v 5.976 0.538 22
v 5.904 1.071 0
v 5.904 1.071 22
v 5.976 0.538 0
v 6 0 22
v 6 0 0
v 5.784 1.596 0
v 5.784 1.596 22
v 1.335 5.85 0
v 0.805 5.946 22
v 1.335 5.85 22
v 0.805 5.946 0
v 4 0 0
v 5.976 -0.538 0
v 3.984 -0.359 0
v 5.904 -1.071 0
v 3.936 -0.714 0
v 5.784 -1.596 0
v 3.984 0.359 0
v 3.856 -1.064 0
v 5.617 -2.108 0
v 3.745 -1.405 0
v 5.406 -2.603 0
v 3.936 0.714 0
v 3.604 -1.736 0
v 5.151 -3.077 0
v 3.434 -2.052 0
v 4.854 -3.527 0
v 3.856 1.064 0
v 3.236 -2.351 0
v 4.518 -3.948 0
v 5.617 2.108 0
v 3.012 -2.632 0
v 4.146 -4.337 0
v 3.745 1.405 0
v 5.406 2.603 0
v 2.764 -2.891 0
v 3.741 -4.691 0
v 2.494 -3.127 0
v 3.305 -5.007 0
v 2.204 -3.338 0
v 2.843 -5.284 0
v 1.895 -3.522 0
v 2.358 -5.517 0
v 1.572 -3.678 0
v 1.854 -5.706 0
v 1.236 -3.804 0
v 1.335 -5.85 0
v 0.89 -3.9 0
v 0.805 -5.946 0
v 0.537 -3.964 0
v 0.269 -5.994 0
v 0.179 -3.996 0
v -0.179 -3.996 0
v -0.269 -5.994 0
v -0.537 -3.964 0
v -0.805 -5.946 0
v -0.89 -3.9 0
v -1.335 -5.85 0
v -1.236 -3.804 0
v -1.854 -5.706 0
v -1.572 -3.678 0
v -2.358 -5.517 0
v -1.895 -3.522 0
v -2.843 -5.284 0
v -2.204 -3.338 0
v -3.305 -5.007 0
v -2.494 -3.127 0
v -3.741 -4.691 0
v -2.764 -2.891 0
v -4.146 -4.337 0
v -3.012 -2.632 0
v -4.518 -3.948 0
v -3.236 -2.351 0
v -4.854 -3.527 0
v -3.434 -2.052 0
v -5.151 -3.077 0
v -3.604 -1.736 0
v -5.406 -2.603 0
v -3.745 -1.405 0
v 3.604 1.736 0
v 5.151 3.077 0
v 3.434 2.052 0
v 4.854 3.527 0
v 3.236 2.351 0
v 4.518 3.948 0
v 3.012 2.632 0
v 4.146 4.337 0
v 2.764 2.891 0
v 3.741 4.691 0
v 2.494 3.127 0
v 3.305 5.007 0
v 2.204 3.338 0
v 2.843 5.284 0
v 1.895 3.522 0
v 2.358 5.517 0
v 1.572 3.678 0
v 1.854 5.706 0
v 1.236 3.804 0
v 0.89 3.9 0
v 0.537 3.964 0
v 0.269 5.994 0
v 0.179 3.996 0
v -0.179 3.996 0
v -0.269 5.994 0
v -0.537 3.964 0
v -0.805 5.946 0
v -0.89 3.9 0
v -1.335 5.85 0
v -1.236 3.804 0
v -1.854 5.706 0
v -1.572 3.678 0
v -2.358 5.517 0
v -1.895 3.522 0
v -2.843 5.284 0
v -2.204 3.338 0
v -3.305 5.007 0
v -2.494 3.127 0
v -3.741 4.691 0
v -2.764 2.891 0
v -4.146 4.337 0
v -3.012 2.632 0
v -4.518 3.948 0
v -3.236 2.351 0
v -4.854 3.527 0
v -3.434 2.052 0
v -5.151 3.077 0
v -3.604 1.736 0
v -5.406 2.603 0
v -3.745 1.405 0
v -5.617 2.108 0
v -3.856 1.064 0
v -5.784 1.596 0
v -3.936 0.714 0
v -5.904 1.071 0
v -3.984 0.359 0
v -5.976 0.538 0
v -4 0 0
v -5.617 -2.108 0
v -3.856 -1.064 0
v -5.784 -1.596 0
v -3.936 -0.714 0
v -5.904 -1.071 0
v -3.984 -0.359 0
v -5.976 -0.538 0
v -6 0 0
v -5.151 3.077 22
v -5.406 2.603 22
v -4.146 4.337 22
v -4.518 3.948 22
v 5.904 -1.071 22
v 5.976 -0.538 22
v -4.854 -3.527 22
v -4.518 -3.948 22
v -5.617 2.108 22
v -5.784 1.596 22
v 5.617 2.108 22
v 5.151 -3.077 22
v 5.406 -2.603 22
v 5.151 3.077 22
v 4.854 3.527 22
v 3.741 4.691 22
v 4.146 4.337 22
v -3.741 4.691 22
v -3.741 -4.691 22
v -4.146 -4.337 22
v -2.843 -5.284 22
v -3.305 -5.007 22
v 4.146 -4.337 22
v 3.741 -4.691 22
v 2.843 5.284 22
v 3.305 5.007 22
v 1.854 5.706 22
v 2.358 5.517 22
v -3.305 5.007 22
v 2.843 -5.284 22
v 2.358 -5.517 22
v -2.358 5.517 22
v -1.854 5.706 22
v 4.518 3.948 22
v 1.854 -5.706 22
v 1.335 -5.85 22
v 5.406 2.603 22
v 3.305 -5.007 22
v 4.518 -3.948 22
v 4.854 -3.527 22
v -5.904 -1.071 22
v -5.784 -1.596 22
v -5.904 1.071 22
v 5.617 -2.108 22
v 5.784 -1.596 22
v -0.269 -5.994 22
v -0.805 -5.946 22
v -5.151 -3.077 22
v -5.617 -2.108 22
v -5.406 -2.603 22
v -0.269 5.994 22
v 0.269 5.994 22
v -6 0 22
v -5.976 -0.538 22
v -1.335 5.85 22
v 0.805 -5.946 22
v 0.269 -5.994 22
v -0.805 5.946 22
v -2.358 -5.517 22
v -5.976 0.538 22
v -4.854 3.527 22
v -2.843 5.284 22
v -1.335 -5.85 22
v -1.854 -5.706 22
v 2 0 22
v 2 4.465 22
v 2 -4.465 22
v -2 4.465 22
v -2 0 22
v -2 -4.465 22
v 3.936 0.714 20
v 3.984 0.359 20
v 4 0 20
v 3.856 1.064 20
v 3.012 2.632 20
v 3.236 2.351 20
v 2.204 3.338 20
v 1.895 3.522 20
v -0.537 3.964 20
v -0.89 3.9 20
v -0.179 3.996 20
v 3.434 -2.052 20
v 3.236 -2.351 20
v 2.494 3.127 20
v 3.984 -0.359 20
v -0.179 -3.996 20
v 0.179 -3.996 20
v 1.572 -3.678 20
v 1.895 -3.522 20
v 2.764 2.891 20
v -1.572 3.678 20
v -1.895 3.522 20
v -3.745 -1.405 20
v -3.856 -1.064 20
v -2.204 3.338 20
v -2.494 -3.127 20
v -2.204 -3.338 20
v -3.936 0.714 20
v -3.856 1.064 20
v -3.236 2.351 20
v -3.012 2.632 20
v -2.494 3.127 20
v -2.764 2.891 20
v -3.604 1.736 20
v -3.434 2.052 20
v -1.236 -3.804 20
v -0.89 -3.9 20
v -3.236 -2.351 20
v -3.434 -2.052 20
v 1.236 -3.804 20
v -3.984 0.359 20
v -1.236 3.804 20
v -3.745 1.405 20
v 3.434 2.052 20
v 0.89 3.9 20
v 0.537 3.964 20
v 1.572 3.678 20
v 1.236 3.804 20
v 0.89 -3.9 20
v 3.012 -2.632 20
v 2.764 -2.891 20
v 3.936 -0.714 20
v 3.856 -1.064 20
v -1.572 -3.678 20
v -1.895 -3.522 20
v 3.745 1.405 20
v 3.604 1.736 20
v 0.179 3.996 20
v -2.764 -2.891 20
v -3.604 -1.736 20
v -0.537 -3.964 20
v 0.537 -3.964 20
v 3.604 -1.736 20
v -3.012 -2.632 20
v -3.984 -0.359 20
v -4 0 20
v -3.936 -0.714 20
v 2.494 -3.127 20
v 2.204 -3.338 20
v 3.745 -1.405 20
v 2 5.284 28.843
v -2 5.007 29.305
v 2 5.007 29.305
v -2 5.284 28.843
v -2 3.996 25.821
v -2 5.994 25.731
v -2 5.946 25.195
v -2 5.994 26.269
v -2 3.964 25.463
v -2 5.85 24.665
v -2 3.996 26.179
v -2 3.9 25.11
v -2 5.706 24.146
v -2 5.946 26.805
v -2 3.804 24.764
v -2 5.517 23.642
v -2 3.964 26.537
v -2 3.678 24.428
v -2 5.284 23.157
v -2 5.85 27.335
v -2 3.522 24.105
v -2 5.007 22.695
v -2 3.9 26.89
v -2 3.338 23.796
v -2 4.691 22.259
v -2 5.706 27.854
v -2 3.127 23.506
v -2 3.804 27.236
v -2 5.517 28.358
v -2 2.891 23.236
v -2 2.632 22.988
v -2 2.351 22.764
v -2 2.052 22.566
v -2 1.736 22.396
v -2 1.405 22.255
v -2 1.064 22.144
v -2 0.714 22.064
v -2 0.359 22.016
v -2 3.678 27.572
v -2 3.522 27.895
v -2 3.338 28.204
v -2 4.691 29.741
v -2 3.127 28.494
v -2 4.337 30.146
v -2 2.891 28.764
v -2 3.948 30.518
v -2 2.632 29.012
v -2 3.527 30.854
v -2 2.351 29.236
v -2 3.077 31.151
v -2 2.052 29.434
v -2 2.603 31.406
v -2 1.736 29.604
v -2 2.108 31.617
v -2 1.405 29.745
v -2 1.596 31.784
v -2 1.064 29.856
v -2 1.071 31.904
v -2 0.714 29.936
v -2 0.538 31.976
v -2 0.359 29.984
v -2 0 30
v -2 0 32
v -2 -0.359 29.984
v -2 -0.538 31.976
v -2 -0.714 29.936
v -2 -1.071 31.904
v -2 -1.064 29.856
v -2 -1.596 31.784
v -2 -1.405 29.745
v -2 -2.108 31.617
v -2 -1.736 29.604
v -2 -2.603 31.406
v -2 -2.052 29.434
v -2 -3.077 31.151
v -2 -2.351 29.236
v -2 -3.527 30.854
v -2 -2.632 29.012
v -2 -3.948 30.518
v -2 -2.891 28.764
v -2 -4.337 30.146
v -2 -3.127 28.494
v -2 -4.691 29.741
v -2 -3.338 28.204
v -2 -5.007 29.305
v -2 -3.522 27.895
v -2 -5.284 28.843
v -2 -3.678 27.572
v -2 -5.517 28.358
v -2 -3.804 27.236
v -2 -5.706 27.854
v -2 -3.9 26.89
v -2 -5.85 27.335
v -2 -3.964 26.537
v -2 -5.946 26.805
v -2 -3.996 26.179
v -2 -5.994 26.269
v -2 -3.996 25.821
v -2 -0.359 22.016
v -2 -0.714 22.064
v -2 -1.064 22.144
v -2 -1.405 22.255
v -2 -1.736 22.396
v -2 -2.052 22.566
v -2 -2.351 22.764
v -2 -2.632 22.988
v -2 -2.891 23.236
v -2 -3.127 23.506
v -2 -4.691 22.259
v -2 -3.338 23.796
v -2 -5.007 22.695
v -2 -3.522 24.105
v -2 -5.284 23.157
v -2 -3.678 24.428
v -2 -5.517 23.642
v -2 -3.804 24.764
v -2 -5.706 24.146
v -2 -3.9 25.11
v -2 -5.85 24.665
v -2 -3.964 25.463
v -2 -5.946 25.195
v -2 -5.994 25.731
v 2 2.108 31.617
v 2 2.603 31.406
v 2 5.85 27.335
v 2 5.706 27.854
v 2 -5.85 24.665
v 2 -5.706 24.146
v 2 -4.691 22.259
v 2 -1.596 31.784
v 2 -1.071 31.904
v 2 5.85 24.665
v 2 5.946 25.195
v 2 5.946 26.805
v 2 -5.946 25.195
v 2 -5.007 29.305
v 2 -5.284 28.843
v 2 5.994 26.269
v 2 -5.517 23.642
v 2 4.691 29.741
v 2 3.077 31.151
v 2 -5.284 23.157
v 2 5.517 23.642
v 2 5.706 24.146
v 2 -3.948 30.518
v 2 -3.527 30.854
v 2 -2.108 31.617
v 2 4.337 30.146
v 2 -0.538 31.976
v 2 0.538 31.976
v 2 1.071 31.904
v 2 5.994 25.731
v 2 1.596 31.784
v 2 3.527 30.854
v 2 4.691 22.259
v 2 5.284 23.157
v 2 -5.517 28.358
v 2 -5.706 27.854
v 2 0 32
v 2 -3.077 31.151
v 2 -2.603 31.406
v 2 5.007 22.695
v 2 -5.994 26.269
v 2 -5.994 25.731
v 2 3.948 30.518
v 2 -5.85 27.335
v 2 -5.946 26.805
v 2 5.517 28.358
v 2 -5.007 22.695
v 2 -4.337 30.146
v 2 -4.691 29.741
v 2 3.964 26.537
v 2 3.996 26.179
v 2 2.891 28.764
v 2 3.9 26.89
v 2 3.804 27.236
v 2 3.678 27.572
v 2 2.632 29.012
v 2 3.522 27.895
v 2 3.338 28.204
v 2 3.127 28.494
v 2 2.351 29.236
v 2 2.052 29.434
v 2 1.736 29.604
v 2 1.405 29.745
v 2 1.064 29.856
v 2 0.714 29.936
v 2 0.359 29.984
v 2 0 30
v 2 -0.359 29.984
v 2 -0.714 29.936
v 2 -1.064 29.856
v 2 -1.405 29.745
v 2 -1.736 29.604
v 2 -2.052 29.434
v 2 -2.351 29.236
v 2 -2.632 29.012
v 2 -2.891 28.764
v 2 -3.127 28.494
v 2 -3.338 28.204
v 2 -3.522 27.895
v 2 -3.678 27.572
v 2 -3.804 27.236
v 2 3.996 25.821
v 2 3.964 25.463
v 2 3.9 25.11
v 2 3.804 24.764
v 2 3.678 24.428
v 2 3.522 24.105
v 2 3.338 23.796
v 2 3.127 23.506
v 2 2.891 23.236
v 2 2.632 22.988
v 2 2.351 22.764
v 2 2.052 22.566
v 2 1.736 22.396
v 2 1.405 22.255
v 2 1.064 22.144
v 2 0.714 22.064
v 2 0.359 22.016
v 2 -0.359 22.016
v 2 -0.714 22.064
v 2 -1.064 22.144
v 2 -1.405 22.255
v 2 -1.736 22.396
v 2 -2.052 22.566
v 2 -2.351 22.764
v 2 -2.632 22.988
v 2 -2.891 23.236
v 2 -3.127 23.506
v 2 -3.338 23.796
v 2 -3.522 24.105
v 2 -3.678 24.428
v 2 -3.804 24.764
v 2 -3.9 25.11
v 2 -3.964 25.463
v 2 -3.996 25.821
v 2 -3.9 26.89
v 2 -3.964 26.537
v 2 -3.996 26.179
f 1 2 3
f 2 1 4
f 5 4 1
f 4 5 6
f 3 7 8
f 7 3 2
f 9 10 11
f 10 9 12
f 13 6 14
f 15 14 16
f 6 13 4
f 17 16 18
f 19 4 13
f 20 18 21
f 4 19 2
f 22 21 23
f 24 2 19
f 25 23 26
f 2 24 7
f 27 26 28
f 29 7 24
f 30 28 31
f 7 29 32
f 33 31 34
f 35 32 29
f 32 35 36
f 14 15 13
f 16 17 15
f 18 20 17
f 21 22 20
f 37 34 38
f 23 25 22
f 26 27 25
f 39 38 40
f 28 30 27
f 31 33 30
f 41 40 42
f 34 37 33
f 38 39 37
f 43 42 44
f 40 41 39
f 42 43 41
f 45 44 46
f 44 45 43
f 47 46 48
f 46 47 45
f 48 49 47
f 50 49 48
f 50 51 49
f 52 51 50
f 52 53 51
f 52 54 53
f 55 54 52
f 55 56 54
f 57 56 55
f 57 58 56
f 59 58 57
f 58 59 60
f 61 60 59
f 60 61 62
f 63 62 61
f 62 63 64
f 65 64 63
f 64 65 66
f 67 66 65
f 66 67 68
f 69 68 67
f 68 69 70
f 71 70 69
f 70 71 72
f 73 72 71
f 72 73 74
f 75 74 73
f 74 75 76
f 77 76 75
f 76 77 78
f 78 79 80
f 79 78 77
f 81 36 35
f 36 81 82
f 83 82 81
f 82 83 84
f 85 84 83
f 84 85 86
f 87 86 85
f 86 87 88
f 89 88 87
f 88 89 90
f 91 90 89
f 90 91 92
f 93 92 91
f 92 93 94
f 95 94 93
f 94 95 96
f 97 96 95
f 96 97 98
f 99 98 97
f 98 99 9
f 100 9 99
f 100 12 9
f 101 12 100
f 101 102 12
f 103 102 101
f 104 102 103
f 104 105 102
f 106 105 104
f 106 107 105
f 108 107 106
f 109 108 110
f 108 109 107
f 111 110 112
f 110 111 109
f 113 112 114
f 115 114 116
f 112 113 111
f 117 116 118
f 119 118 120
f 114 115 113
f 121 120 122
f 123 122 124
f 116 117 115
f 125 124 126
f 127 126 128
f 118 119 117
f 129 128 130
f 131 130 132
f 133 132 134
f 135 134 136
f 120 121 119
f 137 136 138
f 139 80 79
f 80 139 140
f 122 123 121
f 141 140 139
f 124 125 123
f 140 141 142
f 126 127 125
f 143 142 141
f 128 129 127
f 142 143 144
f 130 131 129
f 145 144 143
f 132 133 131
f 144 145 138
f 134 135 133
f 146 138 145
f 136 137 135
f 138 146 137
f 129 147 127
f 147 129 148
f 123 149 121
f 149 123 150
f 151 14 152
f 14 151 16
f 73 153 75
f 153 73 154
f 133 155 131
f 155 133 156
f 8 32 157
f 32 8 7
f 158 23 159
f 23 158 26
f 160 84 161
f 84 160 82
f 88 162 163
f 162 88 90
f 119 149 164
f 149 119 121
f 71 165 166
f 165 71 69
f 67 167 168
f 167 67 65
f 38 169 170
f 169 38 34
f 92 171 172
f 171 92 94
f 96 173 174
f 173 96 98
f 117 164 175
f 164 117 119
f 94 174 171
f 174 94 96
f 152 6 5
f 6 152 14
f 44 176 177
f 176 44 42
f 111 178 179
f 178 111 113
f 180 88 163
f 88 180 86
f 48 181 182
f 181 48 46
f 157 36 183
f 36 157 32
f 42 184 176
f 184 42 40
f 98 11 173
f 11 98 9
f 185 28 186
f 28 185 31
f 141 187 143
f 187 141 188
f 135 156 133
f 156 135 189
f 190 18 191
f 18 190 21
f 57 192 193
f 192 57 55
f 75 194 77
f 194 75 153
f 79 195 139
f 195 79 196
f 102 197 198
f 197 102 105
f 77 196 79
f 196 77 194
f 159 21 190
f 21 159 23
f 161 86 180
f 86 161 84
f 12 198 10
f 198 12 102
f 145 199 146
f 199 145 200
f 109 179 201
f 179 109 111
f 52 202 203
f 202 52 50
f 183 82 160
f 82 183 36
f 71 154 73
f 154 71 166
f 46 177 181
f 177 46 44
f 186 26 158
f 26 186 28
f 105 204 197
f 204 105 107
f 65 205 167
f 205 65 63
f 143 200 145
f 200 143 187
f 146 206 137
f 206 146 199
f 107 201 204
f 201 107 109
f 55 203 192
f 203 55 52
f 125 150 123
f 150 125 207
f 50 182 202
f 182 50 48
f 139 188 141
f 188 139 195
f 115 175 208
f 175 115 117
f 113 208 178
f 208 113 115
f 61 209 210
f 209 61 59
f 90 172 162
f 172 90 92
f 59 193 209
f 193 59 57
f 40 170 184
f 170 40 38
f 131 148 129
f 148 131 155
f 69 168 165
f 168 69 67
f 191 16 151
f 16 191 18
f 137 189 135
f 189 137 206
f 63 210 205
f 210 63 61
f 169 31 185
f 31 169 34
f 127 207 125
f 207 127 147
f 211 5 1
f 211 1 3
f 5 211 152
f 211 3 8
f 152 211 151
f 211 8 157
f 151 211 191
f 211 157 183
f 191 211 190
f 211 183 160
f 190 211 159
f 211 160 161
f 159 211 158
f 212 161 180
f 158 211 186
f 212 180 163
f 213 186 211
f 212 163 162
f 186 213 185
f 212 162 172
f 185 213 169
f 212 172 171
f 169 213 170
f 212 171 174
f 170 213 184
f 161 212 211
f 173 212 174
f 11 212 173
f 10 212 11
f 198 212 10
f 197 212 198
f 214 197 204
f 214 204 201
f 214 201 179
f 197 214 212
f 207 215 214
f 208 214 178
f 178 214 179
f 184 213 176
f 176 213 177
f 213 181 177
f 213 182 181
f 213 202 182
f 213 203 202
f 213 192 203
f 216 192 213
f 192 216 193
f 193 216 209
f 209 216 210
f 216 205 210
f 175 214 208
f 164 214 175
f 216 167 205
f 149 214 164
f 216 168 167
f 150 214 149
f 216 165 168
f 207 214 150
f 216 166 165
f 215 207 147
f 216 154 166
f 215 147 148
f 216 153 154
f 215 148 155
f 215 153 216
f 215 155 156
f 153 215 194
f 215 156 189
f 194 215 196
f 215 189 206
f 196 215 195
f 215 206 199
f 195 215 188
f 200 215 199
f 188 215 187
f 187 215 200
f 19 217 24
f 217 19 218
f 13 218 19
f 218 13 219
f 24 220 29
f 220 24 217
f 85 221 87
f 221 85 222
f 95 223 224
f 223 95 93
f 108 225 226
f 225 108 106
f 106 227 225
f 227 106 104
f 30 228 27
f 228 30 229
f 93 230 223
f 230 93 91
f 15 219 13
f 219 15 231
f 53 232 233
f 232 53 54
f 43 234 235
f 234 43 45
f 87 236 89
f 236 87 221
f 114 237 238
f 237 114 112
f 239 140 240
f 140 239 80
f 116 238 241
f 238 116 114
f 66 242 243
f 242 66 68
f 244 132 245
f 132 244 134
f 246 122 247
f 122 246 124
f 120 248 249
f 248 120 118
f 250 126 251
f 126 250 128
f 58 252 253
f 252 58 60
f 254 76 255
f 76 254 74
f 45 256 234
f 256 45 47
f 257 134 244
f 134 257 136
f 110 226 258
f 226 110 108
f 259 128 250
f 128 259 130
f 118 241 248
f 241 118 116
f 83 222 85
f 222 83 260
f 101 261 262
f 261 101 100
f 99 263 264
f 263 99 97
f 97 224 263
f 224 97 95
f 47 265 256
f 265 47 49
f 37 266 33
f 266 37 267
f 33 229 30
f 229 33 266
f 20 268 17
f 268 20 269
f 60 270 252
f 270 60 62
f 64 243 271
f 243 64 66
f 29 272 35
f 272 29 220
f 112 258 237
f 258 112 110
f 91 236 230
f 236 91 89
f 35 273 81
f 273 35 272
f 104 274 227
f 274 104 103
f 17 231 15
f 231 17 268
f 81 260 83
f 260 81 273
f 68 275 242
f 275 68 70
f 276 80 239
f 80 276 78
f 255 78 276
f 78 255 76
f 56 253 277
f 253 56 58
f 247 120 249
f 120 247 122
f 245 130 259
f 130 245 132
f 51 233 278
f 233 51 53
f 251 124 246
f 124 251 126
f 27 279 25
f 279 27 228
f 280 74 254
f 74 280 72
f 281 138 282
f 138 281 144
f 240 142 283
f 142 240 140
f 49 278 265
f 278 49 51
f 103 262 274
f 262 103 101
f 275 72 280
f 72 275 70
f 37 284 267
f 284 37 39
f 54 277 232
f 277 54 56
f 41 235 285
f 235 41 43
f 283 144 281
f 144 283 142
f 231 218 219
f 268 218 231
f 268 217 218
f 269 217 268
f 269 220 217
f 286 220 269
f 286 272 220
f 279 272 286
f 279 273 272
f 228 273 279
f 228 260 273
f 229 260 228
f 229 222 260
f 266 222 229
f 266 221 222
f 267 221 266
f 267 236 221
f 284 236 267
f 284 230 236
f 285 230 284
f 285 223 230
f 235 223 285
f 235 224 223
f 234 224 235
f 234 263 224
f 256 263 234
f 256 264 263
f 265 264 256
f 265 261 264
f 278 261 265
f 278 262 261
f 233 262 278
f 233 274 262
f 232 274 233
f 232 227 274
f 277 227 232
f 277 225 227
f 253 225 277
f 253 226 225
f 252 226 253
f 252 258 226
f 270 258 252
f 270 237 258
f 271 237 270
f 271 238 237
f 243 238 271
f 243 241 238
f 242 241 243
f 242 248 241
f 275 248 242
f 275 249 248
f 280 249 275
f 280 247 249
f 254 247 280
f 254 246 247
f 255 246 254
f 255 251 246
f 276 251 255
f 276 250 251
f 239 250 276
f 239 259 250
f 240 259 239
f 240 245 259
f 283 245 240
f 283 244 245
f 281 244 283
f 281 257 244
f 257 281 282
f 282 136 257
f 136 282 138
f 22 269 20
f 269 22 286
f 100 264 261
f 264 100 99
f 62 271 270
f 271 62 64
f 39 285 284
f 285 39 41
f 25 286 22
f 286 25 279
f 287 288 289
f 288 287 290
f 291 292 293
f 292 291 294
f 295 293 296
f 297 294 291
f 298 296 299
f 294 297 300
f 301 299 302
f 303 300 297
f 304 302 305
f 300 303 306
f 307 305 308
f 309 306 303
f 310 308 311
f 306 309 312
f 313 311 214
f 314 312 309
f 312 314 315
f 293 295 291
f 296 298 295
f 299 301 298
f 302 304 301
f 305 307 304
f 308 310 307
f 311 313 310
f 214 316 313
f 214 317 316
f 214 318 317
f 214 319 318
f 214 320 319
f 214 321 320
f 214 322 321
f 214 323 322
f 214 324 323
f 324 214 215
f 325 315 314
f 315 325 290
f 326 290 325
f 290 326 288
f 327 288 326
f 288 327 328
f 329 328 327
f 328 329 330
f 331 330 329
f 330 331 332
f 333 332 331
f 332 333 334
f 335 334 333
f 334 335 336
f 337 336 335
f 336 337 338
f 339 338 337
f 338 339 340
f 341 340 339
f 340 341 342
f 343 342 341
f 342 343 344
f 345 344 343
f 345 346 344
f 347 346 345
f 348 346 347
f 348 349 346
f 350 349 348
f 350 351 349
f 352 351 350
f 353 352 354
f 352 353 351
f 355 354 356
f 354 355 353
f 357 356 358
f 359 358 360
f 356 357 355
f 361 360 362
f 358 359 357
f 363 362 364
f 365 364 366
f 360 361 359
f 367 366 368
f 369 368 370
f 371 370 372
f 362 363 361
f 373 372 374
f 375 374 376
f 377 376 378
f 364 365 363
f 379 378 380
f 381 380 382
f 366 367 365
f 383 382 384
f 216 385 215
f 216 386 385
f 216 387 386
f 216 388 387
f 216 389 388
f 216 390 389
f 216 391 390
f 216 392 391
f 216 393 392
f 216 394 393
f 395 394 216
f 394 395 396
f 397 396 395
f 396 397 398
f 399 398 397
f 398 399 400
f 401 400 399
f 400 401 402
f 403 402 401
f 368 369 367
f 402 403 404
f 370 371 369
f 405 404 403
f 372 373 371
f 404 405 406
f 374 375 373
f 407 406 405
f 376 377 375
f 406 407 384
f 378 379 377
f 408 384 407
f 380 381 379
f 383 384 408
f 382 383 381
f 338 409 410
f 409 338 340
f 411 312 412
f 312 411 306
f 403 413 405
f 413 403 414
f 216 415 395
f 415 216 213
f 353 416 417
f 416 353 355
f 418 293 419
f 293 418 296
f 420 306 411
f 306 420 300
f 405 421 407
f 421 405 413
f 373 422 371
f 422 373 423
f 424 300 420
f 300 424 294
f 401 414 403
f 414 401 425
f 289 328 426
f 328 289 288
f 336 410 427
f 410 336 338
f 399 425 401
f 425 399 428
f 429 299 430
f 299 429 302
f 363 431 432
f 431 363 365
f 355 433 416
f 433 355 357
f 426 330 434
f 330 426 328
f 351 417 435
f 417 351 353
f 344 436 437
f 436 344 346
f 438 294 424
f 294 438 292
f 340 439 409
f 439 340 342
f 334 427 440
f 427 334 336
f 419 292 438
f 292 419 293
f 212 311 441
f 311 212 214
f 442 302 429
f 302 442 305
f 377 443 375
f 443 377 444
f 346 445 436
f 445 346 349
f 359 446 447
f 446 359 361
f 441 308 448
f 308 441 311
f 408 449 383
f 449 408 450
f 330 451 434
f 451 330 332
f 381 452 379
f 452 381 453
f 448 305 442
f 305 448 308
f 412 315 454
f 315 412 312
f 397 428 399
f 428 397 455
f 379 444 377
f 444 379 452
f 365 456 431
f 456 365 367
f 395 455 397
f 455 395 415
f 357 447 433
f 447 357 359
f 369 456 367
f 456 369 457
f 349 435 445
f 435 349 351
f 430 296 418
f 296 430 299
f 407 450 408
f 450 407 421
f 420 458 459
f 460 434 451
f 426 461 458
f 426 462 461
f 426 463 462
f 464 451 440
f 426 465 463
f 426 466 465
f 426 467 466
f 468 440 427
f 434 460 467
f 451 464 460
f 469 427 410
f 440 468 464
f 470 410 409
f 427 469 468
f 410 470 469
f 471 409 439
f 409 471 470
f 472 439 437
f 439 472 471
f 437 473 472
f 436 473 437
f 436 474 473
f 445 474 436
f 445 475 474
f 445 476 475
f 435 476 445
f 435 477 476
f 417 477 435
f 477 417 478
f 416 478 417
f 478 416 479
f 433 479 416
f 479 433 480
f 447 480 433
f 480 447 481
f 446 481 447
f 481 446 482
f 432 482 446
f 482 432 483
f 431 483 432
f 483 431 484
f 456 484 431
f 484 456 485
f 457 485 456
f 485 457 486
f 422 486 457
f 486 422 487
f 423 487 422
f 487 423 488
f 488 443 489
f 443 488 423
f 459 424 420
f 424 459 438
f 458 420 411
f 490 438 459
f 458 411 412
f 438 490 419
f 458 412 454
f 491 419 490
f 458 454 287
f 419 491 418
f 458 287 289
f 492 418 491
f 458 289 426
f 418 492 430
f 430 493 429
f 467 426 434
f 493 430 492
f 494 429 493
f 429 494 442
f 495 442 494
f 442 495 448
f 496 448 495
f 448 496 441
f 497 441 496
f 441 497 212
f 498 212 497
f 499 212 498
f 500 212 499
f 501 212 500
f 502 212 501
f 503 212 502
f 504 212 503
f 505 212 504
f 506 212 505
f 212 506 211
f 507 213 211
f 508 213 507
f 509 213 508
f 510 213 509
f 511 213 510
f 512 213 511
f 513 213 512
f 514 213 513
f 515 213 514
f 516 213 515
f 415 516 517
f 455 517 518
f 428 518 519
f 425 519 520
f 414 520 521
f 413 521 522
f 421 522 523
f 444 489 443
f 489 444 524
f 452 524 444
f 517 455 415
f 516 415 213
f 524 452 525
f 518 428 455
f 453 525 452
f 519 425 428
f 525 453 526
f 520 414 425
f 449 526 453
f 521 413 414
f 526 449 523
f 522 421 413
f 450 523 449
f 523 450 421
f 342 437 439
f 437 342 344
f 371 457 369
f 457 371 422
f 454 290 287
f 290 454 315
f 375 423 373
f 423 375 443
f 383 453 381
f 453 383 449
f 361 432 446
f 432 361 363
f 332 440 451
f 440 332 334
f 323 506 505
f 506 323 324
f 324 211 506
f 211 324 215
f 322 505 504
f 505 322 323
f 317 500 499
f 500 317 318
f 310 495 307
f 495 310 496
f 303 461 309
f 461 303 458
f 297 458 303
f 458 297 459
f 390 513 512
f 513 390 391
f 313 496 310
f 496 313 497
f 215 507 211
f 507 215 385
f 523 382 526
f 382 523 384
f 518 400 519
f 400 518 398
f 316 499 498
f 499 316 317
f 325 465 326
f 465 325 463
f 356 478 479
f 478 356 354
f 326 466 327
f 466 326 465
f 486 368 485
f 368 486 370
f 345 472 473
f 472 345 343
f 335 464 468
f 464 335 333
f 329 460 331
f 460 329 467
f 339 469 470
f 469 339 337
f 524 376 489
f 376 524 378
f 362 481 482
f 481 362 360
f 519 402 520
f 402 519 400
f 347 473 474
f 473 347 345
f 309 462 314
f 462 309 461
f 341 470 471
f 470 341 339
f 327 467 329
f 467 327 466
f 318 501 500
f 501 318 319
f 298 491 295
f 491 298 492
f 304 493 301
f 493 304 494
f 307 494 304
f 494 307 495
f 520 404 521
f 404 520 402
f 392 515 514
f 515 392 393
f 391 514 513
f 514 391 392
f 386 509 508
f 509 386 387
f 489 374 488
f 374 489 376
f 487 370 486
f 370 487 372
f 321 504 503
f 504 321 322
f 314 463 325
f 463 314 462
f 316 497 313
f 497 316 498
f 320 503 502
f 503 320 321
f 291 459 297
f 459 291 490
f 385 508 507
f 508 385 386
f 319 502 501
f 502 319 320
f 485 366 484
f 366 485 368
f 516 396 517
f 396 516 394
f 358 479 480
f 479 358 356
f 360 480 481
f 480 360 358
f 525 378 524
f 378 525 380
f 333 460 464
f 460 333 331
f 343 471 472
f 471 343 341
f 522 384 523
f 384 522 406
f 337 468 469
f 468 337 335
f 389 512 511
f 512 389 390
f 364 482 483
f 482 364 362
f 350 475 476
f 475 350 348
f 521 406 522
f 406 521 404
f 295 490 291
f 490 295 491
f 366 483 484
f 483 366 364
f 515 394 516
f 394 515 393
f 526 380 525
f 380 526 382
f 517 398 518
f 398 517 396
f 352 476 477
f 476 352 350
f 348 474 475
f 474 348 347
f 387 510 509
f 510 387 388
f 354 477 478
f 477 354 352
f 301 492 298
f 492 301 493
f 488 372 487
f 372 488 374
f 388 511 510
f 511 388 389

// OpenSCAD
module union_dos_palitos(){
	r = 7/2;
	h = 60;
	t = 2;
	$fn=70;
	difference(){
		cylinder(h=h,r=t+r);
		cylinder(h=h,r=r);
	}
}

module colgador_palo(){
	r = 8/2;
	h = 20;
	t = 2;
	$fn=70;
	difference(){
		cylinder(h=h+t,r=t+r);
		cylinder(h=h,r=r);
	}
	translate([-t,0,h+t+r])
	rotate(a=[0,90,0])
	difference(){
		cylinder(h=2*t,r=t+r);
		cylinder(h=2*t,r=r);
	}
}

module strip_hook(){
	r = 8/2;
	h = 5;
	t = 2;
	w = 5;
	l = 15;
	$fn=70;
	difference(){
		cylinder(h=h,r=t+r);
		cylinder(h=h,r=r);
		translate([-t,0,0])
		cube([r+2*t,r+t,h]);
	}
	translate([r+t,-l/2,0])
	difference(){
		translate([-t,0,0])
		cube([w+2*t,l+t,h]);
		cube([w,l,h]);
	}

}
// union_dos_palitos();
 colgador_palo();
// strip_hook();
